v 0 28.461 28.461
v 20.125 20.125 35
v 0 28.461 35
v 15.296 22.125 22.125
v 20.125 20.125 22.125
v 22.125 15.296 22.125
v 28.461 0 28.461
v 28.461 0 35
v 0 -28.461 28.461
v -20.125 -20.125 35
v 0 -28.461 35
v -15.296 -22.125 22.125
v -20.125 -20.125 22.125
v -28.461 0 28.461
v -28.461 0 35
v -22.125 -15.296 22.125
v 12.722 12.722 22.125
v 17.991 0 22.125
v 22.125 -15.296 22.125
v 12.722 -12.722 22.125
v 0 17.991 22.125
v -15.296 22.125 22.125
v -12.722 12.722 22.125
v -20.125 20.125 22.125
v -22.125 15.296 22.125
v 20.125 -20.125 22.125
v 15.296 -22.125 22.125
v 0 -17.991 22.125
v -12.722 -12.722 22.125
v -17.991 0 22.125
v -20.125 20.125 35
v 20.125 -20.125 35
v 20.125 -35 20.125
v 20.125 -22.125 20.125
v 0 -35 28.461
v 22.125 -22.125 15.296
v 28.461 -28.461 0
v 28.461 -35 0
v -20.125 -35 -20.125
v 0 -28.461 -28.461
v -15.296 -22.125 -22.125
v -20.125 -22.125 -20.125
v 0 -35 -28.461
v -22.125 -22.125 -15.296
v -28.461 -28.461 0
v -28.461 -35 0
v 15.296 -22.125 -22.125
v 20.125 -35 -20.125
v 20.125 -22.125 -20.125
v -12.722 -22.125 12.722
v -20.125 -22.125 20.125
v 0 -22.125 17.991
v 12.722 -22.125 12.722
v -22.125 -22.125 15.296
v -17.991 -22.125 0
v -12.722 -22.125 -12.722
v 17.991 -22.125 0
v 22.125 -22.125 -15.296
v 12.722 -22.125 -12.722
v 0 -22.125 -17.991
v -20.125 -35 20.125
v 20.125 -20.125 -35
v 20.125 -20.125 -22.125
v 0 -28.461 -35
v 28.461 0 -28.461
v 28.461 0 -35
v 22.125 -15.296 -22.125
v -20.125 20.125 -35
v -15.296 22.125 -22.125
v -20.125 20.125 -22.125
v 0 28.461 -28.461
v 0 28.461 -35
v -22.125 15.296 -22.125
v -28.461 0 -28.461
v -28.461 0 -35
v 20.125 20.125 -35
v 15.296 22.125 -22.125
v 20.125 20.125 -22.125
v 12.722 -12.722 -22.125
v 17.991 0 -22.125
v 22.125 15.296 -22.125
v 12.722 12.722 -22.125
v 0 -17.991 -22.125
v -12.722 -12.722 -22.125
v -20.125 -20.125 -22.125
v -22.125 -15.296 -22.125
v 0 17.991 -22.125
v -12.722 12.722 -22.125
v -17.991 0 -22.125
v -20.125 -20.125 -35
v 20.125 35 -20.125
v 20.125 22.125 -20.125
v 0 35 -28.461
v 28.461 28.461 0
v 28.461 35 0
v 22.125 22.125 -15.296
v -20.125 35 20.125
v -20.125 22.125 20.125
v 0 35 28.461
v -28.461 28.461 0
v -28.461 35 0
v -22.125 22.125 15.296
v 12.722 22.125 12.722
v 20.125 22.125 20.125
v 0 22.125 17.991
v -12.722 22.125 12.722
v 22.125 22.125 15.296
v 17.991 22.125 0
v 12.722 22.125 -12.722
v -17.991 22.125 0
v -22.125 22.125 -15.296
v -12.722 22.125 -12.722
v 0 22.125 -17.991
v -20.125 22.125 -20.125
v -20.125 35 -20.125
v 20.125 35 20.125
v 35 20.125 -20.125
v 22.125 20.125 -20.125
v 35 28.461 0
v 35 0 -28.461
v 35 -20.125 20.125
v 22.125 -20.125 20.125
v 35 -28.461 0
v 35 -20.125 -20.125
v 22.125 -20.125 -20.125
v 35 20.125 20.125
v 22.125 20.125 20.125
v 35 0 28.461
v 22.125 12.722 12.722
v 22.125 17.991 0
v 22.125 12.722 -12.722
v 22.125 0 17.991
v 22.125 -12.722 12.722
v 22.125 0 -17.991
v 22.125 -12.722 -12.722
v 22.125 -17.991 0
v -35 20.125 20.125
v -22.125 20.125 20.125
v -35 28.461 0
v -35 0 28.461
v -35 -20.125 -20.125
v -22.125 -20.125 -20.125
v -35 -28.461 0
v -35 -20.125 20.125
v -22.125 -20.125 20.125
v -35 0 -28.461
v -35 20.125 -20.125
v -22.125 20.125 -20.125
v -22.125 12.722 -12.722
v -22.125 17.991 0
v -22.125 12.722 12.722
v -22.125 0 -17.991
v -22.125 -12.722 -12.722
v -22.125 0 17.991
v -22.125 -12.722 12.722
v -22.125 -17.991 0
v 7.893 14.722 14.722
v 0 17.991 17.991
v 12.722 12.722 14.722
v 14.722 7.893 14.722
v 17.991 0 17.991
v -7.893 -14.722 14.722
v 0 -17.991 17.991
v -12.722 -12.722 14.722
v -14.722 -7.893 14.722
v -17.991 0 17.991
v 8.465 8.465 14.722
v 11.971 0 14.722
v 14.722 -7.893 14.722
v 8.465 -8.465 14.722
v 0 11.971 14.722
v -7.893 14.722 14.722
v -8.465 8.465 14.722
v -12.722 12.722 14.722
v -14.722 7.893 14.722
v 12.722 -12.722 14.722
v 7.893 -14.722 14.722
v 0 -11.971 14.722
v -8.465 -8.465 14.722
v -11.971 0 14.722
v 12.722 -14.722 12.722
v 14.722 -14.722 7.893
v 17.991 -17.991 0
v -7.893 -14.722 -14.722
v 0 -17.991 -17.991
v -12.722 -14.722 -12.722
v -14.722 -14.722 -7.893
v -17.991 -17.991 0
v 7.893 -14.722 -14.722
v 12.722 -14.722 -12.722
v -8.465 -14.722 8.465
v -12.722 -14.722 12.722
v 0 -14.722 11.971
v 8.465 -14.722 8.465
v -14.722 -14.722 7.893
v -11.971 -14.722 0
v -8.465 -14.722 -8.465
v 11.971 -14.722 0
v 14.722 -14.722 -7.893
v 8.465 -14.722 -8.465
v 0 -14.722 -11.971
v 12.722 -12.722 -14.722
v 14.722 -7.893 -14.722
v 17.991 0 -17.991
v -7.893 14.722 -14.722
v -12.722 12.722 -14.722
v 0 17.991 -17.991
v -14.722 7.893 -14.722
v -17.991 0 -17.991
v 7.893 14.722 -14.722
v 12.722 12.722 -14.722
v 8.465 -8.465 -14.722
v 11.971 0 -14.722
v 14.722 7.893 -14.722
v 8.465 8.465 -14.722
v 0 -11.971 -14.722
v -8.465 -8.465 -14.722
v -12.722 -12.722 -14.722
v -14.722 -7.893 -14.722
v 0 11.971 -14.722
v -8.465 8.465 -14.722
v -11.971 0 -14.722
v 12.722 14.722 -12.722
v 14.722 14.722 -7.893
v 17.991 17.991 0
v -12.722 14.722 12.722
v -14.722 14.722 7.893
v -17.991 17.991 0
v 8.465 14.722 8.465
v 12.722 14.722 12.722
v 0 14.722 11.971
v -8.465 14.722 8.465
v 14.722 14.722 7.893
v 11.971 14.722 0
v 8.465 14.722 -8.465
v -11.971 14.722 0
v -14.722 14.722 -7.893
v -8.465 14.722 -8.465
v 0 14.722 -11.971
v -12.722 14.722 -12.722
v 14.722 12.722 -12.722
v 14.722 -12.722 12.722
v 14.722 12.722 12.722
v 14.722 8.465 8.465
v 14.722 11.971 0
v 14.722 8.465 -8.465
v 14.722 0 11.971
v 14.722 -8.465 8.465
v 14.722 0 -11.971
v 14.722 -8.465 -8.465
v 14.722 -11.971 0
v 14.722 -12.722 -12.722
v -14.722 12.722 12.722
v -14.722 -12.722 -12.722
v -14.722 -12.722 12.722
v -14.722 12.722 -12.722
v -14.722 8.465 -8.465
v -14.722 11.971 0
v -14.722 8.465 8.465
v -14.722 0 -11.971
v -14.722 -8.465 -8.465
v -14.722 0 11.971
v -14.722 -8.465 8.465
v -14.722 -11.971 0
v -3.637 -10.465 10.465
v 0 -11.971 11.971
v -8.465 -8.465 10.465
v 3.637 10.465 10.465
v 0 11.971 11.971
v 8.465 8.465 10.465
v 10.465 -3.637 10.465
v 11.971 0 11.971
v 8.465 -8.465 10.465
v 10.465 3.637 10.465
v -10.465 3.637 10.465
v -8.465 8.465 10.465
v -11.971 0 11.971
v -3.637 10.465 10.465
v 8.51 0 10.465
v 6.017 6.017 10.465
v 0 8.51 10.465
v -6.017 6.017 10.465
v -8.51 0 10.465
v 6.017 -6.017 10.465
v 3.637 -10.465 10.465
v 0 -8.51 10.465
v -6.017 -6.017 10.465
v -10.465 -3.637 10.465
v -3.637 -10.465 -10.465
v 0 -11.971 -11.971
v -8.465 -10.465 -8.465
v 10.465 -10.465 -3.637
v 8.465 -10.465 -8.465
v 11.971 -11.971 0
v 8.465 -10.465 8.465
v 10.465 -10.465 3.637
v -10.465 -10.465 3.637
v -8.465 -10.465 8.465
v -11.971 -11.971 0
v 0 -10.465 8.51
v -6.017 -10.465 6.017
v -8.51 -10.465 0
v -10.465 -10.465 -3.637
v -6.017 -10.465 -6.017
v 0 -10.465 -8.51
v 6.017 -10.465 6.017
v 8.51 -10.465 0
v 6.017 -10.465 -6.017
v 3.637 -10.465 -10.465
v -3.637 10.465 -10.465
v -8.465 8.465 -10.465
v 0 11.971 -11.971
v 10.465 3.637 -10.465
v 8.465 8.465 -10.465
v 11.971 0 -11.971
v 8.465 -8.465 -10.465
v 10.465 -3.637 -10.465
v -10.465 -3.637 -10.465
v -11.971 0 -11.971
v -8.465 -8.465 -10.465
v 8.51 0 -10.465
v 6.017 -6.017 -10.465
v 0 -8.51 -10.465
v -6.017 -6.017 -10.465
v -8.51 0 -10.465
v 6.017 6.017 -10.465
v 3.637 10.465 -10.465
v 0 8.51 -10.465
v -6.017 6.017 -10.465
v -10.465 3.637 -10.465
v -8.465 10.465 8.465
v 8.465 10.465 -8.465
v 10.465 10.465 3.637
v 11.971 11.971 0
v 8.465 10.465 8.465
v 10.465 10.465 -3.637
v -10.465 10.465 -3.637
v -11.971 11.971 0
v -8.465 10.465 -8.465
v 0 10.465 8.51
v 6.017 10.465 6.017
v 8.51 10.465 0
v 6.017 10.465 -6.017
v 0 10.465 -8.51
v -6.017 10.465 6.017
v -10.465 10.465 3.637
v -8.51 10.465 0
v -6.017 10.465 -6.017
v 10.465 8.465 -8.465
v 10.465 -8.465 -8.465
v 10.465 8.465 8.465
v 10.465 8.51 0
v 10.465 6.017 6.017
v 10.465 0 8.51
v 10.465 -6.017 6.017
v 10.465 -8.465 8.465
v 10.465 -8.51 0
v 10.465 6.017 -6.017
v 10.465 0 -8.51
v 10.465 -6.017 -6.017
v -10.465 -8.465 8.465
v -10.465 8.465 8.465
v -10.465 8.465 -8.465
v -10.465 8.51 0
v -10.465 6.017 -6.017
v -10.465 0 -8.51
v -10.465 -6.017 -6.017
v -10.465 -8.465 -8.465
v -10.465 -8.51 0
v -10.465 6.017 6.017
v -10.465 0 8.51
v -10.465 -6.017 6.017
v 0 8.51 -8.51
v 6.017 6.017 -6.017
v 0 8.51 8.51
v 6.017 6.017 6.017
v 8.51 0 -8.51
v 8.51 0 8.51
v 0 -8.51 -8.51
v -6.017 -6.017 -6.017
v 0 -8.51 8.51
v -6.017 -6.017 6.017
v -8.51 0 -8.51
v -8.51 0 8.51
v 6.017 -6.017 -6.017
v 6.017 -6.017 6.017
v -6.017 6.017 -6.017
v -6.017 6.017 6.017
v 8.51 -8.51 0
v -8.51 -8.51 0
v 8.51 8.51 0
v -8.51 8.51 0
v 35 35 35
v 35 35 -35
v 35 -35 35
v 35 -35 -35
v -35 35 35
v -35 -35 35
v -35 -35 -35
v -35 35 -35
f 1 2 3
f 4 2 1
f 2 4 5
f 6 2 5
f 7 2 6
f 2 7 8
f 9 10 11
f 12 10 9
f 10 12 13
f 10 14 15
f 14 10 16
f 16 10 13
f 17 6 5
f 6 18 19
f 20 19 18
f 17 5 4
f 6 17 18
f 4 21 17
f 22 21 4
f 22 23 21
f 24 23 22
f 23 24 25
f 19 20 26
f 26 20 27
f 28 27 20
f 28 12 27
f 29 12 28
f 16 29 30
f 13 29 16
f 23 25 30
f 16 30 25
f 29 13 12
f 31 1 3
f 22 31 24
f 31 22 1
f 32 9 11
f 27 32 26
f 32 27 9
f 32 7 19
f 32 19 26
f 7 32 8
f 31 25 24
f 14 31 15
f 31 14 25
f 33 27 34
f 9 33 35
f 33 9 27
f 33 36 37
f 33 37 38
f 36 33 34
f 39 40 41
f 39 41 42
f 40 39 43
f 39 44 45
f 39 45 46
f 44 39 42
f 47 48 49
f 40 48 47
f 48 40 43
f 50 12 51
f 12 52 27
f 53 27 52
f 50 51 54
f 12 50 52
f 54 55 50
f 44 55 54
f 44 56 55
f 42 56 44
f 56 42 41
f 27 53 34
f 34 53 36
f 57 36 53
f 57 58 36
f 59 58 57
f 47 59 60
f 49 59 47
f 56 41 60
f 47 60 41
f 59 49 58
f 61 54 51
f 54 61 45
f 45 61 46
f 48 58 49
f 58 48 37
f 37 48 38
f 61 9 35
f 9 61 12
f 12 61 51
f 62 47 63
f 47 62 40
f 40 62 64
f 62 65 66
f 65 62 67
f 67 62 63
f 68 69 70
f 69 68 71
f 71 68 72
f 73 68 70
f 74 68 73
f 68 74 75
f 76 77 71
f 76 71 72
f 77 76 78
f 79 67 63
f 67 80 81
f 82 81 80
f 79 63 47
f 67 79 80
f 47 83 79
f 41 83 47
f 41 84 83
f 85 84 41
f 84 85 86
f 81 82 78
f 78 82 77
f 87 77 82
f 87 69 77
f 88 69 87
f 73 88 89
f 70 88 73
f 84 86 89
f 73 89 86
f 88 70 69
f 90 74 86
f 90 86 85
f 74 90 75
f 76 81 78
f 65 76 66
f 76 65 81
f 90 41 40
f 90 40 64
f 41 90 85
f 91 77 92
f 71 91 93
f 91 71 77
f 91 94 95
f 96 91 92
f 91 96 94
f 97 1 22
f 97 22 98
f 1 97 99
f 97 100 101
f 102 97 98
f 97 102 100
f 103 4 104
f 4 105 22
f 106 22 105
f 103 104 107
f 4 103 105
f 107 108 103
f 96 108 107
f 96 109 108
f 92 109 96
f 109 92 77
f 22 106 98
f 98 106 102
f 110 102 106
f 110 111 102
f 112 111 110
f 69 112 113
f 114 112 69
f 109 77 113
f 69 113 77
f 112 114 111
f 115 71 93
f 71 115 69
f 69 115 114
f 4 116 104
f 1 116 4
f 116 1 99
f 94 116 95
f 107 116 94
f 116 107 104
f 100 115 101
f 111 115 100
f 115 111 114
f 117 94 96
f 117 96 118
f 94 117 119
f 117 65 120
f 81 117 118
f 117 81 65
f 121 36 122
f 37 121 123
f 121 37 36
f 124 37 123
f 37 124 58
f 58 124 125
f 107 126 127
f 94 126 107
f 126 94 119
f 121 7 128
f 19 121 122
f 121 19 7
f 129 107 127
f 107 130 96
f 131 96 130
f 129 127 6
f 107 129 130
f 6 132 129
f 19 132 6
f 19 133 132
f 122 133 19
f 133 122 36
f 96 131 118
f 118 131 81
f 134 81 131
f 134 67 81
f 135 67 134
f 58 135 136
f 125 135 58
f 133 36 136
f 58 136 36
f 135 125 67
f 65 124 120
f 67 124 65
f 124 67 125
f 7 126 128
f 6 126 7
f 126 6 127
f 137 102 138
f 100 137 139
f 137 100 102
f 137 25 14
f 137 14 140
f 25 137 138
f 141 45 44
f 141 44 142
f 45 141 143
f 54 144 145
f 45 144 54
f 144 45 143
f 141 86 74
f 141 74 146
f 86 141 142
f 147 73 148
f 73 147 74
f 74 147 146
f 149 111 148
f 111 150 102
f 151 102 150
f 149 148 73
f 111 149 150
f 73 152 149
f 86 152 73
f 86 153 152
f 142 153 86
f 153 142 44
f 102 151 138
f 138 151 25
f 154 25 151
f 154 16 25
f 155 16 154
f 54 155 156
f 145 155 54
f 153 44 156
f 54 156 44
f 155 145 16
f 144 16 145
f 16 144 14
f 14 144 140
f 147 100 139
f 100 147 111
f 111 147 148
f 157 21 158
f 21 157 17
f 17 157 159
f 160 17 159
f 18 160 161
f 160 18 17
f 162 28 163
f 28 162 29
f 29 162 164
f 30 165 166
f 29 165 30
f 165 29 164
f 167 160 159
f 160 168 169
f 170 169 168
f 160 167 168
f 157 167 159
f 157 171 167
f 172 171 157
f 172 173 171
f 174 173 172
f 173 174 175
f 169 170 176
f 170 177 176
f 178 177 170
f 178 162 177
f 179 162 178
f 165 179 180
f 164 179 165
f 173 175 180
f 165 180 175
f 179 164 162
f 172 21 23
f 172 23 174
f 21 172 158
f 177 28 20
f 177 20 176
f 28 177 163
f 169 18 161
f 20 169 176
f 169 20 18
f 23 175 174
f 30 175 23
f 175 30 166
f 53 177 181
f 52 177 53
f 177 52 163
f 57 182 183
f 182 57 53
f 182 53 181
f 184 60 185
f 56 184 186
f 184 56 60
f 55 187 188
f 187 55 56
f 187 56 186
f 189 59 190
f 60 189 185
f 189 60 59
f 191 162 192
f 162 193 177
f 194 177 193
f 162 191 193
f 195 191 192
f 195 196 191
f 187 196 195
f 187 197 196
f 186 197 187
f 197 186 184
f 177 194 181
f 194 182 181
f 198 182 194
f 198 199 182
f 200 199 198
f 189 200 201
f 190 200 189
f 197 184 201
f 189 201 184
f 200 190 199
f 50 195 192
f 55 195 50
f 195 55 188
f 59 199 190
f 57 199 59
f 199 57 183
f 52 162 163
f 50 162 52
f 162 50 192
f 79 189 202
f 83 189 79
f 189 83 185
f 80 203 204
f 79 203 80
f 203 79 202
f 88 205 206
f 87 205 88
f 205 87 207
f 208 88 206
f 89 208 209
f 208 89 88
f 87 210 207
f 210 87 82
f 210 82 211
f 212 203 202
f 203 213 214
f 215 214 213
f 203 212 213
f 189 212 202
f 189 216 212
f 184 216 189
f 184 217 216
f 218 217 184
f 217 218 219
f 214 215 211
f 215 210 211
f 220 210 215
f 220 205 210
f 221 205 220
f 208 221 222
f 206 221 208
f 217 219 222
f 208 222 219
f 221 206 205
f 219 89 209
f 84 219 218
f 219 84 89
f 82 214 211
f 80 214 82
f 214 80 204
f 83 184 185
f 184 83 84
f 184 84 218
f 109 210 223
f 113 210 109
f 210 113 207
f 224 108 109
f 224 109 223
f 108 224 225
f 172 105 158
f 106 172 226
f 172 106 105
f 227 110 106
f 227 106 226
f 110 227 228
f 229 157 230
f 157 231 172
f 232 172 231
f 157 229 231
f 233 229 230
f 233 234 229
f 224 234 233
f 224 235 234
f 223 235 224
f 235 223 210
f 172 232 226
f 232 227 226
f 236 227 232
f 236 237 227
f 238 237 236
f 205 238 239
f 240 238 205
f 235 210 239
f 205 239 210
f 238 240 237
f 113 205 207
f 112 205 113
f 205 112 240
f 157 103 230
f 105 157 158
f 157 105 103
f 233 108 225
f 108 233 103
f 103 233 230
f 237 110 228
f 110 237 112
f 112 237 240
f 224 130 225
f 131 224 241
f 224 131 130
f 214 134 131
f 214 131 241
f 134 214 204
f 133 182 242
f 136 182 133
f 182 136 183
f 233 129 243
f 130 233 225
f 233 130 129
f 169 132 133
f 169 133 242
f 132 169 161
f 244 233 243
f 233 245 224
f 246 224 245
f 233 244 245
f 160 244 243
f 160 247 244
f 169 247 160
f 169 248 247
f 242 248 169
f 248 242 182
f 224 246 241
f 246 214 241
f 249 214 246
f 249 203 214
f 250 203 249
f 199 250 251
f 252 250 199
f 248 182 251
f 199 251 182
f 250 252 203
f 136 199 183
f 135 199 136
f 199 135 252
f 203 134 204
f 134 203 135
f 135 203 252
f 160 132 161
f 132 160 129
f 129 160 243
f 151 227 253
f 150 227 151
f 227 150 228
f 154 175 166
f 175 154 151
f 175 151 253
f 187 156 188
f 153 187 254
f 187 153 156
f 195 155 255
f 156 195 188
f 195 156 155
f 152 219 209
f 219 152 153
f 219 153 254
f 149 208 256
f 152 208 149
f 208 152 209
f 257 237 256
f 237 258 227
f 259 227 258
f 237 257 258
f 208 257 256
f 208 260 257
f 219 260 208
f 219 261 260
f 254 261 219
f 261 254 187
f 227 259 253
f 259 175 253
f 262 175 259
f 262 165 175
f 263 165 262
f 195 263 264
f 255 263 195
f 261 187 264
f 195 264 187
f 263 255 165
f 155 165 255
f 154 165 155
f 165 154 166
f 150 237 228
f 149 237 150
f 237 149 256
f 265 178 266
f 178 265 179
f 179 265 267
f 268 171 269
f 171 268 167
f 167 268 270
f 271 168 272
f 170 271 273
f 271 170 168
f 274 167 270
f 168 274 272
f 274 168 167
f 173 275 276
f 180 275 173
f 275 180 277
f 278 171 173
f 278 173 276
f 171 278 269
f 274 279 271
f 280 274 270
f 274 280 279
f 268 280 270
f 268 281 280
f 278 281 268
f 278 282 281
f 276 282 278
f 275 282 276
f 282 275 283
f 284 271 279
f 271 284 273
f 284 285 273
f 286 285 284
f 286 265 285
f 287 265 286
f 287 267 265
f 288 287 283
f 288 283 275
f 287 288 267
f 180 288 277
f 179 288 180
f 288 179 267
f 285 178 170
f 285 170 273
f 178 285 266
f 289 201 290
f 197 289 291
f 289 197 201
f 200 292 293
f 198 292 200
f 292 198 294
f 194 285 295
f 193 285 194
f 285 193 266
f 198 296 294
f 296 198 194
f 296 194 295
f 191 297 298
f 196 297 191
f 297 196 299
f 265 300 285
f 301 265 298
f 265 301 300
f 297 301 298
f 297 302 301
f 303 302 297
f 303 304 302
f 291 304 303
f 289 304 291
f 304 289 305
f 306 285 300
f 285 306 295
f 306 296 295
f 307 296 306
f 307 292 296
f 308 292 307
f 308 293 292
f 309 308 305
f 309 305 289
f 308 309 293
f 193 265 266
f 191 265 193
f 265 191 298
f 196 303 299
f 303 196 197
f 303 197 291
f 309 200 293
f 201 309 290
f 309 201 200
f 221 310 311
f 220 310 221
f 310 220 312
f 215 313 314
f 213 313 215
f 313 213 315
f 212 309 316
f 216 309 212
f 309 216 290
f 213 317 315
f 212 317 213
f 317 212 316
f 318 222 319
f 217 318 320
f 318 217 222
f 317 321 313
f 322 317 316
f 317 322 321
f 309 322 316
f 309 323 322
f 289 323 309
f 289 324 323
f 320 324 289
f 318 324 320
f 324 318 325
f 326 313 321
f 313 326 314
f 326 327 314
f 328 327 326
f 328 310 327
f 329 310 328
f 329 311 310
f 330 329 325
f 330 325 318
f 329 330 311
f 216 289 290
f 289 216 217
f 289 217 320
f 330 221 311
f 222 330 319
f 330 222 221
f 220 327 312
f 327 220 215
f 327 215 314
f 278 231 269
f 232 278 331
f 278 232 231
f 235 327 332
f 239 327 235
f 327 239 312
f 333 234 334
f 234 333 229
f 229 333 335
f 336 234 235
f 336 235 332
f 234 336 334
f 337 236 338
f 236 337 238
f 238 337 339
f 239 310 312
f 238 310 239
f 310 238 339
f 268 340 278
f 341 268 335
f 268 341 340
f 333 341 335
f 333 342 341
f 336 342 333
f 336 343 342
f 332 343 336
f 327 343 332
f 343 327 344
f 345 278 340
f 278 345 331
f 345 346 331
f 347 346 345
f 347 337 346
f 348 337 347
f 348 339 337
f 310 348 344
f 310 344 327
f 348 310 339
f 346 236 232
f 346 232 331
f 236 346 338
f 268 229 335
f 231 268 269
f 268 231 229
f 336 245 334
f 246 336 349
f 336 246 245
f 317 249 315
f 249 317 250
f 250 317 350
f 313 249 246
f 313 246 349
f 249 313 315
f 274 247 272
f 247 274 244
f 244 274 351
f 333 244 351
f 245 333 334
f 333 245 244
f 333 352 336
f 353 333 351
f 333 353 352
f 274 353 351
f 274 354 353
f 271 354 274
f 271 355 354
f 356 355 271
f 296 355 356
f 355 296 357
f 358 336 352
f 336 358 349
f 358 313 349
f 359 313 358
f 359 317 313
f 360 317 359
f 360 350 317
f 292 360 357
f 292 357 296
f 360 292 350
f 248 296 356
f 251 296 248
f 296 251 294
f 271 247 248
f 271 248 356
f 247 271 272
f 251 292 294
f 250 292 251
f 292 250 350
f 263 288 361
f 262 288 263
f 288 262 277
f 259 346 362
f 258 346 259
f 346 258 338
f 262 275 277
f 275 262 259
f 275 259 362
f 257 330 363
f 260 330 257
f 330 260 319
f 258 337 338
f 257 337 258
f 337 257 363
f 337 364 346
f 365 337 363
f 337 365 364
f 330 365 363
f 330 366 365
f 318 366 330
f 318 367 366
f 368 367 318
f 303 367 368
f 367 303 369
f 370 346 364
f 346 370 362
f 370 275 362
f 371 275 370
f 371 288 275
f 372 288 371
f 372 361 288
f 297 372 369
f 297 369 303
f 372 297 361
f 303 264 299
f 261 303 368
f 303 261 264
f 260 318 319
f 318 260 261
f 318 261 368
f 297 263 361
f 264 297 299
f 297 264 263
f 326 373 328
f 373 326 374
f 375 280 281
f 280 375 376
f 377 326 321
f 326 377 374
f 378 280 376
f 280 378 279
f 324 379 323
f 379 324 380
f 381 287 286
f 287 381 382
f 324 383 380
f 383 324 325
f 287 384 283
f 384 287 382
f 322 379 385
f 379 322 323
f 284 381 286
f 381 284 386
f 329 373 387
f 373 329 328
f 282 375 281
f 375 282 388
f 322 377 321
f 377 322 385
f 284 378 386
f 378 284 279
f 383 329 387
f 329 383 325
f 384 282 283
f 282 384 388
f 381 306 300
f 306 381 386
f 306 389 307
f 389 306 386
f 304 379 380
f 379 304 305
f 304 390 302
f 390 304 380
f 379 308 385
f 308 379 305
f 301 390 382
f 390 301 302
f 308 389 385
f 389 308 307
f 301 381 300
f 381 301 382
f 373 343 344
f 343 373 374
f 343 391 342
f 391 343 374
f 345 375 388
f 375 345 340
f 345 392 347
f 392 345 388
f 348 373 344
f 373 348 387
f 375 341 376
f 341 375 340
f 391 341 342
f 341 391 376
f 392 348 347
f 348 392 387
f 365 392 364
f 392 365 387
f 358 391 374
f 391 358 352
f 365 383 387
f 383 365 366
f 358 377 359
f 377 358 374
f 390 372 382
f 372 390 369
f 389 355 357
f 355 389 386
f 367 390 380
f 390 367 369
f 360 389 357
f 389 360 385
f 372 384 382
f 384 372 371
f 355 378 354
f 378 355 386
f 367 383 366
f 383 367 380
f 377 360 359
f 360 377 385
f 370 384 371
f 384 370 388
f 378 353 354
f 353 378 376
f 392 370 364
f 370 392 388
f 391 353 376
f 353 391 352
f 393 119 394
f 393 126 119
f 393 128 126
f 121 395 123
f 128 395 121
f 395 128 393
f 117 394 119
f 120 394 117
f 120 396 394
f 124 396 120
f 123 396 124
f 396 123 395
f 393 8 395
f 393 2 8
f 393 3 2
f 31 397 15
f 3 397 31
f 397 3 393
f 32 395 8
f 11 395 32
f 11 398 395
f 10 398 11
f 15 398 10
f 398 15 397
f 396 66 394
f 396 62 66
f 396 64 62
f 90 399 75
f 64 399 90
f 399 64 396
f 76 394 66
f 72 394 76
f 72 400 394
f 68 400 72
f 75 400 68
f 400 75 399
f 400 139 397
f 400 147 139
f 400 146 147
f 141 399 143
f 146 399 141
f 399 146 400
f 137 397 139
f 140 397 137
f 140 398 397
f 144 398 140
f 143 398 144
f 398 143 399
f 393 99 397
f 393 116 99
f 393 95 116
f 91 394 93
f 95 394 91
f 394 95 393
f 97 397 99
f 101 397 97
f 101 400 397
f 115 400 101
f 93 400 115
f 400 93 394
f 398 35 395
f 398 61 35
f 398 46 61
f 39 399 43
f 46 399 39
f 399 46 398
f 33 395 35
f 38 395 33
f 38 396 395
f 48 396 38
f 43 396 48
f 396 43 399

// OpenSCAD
width = 70;
joint_h = 2;
level = 4;
reducing_scale = 0.575; // [0:0.707107]
$fn = 8;

echo(atan2(1, sqrt(2)));

module drilled_cube(width, reducing_scale, joint_h, level) {
    module drills(width, reducing_scale, joint_h, level) {
        w = width * reducing_scale;
        r = 1.41421 * w / 2;
        if(level > 0) {
            z_offset = w / 2 + joint_h;    
            for(i = [0:3]) {
                rotate([i * 90, 0, 0])
                translate([0, 0, z_offset])
                linear_extrude(width)
                    circle(r);
            }
            
            for(ay = [90, -90]) {
                rotate([0, ay, 0])
                translate([0, 0, z_offset])
                linear_extrude(width)
                    circle(r);
            }  
            
            drills(z_offset * 2, reducing_scale, joint_h, level - 1);
        }
        else {
            for(i = [0:3]) {
                rotate([i * 90, 0, 0])
                linear_extrude(width)
                    circle(r);
            }
            
            for(ay = [90, -90]) {
                rotate([0, ay, 0])
                linear_extrude(width)
                    circle(r);
            }      
        }
    }

    difference() {
        cube(width, center = true);
        drills(width, reducing_scale, joint_h, level - 1);
    }
}


drilled_cube(width, reducing_scale, joint_h, level);
